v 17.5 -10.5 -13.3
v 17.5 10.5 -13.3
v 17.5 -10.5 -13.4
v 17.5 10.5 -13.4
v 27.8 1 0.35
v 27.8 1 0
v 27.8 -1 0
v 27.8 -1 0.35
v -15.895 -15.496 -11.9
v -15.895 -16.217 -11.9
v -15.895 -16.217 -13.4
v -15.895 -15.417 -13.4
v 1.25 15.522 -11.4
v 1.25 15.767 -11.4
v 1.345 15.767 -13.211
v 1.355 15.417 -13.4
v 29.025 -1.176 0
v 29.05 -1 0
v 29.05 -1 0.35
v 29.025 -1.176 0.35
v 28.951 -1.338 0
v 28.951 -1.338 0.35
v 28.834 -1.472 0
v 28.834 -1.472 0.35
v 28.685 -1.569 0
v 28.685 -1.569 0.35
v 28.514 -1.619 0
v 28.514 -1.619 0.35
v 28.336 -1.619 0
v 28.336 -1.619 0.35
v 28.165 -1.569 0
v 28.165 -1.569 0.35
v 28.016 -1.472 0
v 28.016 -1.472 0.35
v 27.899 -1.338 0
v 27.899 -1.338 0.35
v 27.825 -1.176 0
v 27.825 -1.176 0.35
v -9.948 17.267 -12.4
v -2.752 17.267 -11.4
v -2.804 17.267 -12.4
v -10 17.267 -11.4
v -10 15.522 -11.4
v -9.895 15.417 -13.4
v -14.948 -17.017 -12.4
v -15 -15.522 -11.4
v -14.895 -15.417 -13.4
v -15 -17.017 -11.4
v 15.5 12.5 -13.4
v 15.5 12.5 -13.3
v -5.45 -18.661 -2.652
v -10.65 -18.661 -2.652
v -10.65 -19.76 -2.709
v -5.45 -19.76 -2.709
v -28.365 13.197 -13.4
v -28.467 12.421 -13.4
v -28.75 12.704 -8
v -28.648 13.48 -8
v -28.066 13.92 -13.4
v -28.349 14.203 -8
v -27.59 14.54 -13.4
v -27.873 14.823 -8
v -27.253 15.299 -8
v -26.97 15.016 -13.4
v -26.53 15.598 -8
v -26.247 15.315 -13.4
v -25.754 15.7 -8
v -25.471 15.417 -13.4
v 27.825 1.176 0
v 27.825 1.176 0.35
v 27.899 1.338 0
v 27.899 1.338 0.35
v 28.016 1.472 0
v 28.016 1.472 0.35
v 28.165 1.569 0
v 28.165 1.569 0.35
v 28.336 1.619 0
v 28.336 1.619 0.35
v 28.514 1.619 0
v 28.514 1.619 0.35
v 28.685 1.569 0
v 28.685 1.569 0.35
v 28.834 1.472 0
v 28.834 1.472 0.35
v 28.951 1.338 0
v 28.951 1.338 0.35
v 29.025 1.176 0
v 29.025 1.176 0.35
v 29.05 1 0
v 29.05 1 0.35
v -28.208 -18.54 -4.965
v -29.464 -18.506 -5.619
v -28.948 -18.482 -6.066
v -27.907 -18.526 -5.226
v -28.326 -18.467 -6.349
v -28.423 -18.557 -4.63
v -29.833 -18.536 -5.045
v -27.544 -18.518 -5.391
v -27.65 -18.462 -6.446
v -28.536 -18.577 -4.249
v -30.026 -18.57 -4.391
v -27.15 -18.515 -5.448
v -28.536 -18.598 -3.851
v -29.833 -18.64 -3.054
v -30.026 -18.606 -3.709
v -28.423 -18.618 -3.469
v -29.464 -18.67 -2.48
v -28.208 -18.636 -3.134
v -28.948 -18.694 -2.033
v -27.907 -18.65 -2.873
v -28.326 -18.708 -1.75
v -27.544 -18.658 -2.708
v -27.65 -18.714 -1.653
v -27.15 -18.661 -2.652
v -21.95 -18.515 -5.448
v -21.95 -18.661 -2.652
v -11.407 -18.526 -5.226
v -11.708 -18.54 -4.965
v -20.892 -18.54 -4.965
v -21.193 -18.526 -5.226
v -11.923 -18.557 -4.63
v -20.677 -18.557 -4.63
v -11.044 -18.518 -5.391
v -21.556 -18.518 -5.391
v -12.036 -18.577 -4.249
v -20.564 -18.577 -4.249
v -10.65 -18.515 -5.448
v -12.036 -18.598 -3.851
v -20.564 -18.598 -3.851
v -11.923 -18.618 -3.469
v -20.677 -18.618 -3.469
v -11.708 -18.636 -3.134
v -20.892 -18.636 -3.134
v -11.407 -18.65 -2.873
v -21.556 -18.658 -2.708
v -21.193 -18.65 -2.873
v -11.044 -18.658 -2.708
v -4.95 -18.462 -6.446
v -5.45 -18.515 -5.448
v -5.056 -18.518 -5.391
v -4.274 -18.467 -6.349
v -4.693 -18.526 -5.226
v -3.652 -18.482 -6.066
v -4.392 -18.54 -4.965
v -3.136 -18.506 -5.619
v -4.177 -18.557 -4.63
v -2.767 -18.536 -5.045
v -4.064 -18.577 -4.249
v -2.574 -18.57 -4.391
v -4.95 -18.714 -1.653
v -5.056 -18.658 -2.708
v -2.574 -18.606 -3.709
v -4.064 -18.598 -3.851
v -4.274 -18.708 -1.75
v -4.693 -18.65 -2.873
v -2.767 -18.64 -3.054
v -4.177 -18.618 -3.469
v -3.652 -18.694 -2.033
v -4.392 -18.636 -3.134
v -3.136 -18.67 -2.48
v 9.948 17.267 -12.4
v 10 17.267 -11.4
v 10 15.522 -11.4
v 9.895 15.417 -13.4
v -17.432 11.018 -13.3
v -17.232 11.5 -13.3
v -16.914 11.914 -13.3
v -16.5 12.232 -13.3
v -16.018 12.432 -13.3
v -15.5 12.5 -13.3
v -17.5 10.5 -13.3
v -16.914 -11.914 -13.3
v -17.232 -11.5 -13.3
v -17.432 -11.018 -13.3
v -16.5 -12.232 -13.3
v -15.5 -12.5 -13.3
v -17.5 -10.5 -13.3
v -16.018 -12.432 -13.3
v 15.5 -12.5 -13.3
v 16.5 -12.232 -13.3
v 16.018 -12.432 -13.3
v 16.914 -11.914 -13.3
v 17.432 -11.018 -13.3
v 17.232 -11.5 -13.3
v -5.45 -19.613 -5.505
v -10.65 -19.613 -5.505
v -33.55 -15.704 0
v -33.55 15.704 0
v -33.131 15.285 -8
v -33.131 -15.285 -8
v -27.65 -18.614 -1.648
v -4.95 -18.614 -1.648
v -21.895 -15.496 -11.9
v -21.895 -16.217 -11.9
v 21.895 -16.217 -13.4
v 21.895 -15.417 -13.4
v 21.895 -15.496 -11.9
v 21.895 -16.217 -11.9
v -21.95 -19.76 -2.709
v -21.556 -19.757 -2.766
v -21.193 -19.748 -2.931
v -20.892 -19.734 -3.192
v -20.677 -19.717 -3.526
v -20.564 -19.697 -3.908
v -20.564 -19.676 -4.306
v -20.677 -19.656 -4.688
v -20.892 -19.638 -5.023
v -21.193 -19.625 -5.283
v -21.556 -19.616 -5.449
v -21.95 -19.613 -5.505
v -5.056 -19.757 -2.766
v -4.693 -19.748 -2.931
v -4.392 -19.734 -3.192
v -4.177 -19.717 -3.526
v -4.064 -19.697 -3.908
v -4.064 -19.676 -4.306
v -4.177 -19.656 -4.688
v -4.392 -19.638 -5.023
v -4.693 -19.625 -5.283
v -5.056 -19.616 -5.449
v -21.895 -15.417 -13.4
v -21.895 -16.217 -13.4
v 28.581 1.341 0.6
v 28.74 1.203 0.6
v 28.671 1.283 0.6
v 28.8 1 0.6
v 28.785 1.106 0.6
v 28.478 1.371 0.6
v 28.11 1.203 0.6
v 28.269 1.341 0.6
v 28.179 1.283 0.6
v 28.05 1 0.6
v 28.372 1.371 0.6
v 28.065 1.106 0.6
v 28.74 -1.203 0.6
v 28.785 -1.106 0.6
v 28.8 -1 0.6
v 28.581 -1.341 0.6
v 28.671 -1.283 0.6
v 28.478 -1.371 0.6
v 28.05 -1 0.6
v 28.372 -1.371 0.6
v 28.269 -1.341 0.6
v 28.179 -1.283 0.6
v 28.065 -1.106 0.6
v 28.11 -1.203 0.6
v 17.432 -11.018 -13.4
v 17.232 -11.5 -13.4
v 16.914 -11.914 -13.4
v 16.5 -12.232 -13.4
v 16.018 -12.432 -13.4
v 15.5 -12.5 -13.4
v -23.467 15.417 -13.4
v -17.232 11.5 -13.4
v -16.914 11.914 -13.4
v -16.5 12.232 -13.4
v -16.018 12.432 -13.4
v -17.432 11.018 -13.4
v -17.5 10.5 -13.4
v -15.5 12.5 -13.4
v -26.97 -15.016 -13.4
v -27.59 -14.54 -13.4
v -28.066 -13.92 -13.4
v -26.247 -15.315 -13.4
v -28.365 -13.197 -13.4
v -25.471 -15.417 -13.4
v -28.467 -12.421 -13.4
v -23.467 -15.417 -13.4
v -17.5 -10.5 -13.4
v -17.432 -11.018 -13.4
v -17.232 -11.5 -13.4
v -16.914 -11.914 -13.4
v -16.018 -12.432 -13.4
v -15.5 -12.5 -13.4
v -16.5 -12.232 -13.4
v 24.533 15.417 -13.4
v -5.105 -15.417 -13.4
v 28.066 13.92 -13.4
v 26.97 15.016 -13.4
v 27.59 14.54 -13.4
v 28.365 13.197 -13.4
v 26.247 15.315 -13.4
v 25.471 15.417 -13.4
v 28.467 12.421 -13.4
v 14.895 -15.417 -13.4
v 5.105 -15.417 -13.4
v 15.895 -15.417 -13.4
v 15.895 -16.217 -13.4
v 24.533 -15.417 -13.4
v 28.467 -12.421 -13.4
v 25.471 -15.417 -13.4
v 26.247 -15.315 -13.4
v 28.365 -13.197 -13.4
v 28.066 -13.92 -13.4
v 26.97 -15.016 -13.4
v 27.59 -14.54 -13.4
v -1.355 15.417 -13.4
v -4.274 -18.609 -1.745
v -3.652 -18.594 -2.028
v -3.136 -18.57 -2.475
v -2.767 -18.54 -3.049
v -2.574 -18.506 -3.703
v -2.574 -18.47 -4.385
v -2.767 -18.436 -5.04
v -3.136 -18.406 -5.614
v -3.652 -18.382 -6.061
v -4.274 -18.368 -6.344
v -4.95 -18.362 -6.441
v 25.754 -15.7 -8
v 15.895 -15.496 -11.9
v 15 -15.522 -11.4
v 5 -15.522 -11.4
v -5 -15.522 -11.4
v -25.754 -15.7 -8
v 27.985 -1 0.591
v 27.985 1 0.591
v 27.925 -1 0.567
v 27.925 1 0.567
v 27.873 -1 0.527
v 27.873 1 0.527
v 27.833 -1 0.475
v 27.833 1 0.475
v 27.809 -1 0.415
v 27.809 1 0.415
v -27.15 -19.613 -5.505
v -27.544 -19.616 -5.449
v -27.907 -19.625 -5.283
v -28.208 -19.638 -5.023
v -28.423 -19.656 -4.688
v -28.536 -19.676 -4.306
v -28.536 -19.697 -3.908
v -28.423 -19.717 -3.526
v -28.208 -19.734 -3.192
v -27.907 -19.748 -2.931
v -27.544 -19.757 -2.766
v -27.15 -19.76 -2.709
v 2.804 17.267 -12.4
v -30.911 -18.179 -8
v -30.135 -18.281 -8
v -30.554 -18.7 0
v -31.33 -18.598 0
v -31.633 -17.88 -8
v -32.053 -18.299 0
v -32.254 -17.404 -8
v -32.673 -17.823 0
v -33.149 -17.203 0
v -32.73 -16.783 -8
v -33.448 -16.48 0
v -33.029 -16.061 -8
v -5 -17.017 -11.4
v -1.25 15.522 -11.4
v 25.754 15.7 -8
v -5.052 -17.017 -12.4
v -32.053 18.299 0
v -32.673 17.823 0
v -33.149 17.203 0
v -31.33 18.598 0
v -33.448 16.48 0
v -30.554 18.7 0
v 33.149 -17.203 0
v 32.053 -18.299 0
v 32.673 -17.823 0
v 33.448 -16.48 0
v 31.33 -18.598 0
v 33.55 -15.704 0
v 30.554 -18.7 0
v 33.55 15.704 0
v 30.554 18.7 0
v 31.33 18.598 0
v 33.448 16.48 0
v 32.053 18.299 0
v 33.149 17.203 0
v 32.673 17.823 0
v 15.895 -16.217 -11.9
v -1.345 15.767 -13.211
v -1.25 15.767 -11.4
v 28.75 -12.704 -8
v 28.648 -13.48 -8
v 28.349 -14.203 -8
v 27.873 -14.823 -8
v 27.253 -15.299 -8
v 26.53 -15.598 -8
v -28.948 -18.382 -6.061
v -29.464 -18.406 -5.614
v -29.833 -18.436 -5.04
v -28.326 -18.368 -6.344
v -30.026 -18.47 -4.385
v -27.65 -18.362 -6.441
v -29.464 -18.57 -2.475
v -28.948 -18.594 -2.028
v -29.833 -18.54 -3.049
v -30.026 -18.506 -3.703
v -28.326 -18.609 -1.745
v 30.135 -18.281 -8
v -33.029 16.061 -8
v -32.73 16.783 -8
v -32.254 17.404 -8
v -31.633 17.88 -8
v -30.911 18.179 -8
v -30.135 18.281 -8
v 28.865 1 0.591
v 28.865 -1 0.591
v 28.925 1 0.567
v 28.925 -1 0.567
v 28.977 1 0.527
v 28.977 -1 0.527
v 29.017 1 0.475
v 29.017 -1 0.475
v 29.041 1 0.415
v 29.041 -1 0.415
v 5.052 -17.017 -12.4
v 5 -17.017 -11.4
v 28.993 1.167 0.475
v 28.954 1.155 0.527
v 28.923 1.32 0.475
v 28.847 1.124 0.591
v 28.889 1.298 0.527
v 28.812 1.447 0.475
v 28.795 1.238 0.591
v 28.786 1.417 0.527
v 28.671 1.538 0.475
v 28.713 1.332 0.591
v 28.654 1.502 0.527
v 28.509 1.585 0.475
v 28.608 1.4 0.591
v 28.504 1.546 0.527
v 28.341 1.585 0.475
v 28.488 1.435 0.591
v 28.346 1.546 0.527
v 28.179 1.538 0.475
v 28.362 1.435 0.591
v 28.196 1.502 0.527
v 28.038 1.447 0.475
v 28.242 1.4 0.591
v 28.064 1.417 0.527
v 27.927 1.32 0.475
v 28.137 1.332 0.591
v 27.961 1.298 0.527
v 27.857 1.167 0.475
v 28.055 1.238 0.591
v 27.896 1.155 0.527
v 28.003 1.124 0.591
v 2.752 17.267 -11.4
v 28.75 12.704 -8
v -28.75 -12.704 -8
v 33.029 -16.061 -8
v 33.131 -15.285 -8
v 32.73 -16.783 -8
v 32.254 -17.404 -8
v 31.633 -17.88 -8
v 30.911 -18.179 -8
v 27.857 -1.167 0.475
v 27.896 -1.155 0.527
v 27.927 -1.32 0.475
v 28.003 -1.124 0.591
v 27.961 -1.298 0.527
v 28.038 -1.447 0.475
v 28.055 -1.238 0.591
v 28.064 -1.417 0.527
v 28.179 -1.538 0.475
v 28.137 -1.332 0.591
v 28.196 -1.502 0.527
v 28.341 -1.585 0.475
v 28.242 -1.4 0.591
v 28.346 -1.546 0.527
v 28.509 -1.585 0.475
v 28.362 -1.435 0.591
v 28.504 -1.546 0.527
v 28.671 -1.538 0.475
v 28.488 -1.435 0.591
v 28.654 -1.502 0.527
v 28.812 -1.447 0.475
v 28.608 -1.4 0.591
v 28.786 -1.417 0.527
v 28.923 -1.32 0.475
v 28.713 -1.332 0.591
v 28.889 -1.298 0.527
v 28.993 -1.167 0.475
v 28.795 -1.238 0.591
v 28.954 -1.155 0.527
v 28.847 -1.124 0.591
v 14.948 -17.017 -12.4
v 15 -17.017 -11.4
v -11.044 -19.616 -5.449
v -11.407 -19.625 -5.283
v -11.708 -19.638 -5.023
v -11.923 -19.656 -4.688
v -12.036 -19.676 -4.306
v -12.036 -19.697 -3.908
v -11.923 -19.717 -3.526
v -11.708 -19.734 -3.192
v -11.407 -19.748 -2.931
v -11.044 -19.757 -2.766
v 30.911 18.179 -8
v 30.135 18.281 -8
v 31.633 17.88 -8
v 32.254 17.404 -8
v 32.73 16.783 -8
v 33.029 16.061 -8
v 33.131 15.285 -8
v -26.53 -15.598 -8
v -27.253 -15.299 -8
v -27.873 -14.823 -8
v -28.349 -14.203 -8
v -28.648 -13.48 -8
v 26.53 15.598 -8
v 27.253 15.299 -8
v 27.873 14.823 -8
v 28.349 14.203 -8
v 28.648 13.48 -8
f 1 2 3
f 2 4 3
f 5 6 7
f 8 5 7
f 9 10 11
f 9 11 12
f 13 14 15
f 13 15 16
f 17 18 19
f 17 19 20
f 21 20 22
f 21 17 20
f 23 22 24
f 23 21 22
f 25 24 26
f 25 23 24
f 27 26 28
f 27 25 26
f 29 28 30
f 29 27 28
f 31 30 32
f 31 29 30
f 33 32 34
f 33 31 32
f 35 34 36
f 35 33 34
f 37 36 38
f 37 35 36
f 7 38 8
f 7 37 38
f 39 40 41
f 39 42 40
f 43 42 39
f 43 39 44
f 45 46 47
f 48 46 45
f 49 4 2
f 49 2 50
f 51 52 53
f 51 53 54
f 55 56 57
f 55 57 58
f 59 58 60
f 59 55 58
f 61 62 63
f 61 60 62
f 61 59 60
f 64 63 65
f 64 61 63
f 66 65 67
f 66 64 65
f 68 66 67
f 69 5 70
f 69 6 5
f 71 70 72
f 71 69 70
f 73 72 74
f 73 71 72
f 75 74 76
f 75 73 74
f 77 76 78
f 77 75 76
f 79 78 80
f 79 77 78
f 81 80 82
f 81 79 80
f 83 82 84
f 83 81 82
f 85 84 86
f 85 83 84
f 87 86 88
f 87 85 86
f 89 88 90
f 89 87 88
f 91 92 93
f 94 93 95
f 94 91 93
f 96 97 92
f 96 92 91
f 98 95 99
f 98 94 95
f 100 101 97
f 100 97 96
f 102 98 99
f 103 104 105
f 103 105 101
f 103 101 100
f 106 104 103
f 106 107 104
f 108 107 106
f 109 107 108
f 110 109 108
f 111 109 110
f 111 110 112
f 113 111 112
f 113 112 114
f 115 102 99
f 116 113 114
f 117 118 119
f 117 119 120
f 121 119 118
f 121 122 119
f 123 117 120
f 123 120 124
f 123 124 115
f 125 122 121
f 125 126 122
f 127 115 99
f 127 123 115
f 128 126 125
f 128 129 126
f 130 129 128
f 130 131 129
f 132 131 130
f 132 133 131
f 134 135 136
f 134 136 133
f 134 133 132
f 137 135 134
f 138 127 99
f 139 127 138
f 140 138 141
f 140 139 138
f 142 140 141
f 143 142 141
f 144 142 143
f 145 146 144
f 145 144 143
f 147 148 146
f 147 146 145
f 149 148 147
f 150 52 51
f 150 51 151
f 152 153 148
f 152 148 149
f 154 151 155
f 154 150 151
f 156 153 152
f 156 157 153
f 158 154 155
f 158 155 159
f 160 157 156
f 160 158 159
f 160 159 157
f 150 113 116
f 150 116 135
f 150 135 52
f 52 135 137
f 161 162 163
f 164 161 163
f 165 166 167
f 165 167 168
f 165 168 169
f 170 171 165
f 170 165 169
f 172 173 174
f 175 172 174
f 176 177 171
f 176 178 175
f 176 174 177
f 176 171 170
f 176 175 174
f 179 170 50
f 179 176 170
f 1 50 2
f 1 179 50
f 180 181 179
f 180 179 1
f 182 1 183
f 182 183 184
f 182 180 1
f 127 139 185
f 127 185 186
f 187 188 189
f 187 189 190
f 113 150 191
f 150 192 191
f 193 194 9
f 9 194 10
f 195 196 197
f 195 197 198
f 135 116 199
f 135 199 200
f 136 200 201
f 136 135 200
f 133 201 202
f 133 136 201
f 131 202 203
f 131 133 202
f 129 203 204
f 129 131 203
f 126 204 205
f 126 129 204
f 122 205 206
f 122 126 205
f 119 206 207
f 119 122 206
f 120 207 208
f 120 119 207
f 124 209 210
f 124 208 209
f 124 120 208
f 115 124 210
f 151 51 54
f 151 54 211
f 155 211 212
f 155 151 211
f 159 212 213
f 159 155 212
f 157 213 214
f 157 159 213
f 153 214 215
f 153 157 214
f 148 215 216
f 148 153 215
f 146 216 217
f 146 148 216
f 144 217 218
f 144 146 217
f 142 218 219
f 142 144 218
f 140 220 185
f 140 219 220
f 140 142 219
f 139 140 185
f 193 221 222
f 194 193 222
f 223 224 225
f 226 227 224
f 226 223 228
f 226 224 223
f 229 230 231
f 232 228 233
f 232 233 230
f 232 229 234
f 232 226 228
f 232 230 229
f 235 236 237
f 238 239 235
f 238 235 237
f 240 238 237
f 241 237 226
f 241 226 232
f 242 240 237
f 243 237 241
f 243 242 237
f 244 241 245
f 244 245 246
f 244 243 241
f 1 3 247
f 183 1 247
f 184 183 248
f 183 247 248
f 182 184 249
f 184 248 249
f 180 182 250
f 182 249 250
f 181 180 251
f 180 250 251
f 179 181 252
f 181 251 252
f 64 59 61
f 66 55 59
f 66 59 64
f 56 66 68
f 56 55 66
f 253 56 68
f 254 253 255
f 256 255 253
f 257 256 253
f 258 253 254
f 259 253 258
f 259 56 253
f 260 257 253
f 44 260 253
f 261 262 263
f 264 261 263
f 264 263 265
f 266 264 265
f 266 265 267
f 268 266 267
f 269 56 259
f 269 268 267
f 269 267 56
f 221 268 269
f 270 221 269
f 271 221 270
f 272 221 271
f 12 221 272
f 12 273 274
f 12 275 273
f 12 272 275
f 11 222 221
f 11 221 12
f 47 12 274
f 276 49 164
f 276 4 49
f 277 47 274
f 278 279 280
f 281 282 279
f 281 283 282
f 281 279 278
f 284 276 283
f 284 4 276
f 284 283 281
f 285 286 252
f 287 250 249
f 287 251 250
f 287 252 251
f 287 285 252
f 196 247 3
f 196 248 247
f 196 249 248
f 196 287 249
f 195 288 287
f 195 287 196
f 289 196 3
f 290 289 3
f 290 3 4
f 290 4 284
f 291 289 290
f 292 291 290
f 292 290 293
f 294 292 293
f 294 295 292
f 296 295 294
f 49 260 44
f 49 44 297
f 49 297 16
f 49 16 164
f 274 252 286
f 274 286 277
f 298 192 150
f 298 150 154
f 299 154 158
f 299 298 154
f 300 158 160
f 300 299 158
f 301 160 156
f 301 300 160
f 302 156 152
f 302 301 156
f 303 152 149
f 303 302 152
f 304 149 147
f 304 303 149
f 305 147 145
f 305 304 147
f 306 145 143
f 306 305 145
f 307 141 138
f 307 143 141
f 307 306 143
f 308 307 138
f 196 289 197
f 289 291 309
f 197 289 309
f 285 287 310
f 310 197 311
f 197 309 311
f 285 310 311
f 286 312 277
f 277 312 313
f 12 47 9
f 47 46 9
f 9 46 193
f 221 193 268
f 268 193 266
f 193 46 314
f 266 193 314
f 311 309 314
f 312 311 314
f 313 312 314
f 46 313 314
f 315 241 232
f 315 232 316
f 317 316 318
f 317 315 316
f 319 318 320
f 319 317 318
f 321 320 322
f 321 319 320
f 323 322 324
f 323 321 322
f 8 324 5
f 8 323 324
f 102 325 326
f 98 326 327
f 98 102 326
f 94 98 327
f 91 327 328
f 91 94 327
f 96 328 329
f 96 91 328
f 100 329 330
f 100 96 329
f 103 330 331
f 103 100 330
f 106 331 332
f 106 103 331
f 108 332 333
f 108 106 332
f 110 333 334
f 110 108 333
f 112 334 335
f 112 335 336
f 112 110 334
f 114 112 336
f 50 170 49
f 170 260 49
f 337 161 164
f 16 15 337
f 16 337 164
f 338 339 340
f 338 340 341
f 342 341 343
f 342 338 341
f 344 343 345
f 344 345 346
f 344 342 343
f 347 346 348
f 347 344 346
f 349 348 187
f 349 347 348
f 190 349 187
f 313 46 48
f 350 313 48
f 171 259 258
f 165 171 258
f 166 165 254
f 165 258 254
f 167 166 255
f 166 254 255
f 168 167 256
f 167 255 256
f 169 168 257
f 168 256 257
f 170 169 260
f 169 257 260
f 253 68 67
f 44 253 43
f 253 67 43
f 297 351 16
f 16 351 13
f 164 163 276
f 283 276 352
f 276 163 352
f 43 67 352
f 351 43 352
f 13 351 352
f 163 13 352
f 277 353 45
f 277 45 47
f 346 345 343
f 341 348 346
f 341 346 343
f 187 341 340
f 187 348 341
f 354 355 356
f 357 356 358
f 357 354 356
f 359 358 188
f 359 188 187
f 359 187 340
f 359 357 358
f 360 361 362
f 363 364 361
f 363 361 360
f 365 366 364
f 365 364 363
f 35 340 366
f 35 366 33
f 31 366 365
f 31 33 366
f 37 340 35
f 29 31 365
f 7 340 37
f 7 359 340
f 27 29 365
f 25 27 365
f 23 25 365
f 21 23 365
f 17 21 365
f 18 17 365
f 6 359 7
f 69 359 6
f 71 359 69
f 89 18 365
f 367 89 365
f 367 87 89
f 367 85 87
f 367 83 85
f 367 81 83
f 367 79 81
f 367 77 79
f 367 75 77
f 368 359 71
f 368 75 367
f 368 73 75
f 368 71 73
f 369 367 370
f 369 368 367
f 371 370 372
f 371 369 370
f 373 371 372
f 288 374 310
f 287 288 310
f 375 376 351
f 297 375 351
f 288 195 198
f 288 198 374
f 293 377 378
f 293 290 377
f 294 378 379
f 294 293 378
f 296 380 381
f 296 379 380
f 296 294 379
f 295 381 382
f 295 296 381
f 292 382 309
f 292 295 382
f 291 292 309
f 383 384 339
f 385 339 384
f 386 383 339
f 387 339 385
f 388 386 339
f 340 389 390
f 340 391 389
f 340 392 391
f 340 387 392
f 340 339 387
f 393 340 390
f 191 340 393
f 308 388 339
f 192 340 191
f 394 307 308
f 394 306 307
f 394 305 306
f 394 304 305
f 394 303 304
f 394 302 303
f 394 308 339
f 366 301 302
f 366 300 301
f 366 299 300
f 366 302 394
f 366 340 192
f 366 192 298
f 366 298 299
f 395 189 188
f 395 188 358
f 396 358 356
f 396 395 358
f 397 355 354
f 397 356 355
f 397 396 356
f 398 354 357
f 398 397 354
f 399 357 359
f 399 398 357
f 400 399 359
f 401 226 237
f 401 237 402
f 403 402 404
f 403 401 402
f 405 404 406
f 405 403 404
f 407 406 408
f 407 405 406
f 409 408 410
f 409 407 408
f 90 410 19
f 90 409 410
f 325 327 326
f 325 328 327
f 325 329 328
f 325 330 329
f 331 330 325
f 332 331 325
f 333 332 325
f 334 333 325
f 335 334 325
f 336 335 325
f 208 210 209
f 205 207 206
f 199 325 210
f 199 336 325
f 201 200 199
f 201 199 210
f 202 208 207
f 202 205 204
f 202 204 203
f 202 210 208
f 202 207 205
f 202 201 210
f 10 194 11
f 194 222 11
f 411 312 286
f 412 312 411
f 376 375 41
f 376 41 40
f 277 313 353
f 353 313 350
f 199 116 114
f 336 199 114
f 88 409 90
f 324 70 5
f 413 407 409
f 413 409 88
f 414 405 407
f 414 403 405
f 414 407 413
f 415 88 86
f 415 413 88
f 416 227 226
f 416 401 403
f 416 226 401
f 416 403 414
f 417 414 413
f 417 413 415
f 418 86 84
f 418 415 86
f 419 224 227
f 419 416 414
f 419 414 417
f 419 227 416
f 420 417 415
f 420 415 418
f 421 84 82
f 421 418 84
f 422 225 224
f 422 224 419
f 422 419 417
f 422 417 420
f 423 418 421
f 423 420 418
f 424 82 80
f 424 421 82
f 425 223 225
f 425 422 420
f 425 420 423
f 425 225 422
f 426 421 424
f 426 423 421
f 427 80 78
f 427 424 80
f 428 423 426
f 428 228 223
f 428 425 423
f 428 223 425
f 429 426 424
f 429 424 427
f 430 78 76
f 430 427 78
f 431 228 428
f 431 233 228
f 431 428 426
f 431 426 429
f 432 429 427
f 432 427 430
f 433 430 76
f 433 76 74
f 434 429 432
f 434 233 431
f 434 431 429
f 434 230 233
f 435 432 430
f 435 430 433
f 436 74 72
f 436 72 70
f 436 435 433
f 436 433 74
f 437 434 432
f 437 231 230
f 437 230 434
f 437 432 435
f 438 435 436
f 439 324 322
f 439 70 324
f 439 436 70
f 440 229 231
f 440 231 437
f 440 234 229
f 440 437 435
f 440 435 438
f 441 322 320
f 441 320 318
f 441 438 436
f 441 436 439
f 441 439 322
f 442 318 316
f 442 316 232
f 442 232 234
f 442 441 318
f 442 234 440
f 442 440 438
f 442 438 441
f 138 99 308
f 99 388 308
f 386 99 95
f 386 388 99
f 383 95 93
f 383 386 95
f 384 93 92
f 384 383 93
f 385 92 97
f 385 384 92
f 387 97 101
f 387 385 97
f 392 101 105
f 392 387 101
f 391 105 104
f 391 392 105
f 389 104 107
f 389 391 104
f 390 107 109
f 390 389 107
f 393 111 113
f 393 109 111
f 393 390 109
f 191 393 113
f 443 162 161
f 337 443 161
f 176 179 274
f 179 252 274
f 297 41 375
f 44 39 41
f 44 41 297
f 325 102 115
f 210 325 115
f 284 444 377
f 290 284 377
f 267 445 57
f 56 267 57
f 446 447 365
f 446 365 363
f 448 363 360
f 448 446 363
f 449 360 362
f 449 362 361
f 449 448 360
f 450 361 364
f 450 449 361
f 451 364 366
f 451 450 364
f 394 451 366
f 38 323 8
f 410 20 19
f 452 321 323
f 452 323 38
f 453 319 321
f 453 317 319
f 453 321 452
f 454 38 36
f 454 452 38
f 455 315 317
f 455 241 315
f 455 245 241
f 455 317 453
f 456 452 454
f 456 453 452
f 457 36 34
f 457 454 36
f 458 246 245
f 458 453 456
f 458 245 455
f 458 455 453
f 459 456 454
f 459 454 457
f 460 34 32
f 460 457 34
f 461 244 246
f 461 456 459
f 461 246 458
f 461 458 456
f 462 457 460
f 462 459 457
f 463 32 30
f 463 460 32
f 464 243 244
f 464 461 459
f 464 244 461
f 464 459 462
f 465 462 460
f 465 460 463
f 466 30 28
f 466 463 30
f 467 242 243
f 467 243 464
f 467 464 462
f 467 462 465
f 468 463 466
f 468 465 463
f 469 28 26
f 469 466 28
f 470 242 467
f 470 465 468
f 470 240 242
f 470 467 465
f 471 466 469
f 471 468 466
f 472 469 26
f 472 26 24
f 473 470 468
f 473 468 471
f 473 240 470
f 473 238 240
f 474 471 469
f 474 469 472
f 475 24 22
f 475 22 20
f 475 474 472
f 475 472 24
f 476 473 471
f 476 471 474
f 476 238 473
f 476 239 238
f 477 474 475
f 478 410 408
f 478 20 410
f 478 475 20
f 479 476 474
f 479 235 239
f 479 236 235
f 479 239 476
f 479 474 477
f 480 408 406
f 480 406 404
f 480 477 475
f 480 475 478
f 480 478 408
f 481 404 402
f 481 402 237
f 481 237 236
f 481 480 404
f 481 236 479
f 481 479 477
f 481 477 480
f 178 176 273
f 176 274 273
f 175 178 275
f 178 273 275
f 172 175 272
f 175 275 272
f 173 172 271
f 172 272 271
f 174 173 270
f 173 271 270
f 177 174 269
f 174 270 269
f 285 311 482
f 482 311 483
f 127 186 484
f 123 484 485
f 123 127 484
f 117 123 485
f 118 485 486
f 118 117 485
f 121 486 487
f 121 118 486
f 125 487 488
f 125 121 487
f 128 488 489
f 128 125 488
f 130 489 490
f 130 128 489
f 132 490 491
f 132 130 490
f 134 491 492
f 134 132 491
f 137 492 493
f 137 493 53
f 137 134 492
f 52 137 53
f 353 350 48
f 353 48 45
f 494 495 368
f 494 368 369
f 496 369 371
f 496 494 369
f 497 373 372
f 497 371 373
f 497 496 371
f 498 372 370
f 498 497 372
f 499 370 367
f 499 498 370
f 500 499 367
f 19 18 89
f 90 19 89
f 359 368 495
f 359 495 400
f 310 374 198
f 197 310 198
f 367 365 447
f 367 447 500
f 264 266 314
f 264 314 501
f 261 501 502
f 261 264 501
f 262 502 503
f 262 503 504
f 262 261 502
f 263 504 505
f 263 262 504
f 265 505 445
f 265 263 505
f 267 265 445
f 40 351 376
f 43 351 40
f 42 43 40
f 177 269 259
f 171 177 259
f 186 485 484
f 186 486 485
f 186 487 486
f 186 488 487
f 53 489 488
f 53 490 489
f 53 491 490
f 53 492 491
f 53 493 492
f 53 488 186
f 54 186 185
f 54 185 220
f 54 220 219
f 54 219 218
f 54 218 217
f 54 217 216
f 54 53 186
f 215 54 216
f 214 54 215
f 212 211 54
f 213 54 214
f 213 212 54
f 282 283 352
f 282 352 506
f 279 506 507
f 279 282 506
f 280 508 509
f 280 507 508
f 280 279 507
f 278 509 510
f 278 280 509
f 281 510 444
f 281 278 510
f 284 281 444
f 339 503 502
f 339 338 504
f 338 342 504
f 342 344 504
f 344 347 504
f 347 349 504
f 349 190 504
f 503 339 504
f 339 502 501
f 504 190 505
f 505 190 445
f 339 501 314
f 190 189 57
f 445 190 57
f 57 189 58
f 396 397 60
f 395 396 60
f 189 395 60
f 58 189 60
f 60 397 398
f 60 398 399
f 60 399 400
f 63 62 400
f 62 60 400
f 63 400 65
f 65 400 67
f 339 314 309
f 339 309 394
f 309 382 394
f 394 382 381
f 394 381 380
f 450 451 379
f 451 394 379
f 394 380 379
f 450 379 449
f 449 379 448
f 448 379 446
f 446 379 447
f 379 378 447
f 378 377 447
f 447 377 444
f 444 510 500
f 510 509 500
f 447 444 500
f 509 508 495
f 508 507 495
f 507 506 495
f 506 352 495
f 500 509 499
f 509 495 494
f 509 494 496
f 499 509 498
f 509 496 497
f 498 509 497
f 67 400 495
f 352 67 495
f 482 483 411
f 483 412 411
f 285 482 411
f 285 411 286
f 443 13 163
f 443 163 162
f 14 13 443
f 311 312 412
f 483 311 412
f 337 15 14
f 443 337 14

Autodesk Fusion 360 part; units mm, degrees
sketch "main-upper" plane through (0, 0, 0) normal (0, 0, 1) x (1, 0, 0)
  line L0 (33.55, 18.7) -> (-33.55, 18.7)
  line L1 (-33.55, 18.7) -> (-33.55, -18.7)
  line L2 (-33.55, -18.7) -> (33.55, -18.7)
  line L3 (33.55, -18.7) -> (33.55, 18.7)
  line L4 (33.55, 18.7) -> (-33.55, -18.7) construction
  line L5 (-33.55, 18.7) -> (33.55, -18.7) construction
  dimension "d1" = 67.1
  dimension "d2" = 37.4
extrude "Extrude1" add sketch "main-upper" against normal blind 8 draft -3
sketch "rgb-led" plane through (0, 0, 0) normal (0, 0, 1) x (-1, 0, 0)
  line L0 (-33.55, 18.7) -> (-33.55, -18.7)
  line L1 (-33.55, -18.7) -> (33.55, -18.7)
  line L2 (33.55, -18.7) -> (33.55, 18.7)
  line L3 (33.55, 18.7) -> (-33.55, 18.7)
  line L4 (-27.8, -1) -> (-27.8, 1)
  arc A0 (-27.8, 1) -> (-29.05, 1) centre (-28.425, 1) ccw
  line L5 (-29.05, 1) -> (-29.05, -1)
  arc A1 (-29.05, -1) -> (-27.8, -1) centre (-28.425, -1) ccw
  line L6 (-28.425, -1.625) -> (-28.425, 1.625) construction
  line L7 (-28.425, -18.7) -> (-28.425, 18.7) construction
  point P0 (-28.425, 0)
  point P1 (-28.425, 0)
  dimension "d5" = 3.25
  dimension "d6" = 1.25
  dimension "d8" = 4.5
extrude "Extrude2" add sketch "rgb-led" along normal blind 0.6 contours L4 A0 L5 A1
fillet "Fillet1" radius 0.25 4 edges at (28.425, 1.625, 0.6) (27.8, 0, 0.6) (28.425, -1.625, 0.6) (29.05, 0, 0.6)
sketch "eink" plane through (0, 0, 0) normal (0, 0, 1) x (-1, 0, 0)
  line L0 (-29.05, -1) -> (-29.05, 1)
  arc A0 (-27.8, 1) -> (-29.05, 1) centre (-28.425, 1) ccw
  line L1 (-27.8, 1) -> (-27.8, -1)
  arc A1 (-29.05, -1) -> (-27.8, -1) centre (-28.425, -1) ccw
  line L2 (-33.55, 18.7) -> (-33.55, -18.7)
  line L3 (-33.55, -18.7) -> (33.55, -18.7)
  line L4 (33.55, -18.7) -> (33.55, 18.7)
  line L5 (33.55, 18.7) -> (-33.55, 18.7)
  line L6 (-24.05, 14) -> (24.05, 14)
  line L7 (24.05, 14) -> (24.05, -14)
  line L8 (24.05, -14) -> (-24.05, -14)
  line L9 (-24.05, -14) -> (-24.05, 14)
  line L10 (-24.05, 14) -> (24.05, -14) construction
  line L11 (24.05, 14) -> (-24.05, -14) construction
  dimension "d13" = 48.1
  dimension "d14" = 28
sketch "buttons-base" plane through (0, -18.6488, -0.9773) normal (0, -0.9986, -0.0523) x (1, 0, 0)
  line L0 (-33.1307, -7.0323) -> (33.1307, -7.0323)
  line L1 (33.1307, -7.0323) -> (33.55, 0.9787)
  line L2 (33.55, 0.9787) -> (-33.55, 0.9787)
  line L3 (-33.55, 0.9787) -> (-33.1307, -7.0323)
  line L4 (-27.65, -5.4713) -> (-4.95, -5.4713)
  arc A0 (-4.95, -5.4713) -> (-4.95, -0.6713) centre (-4.95, -3.0713) ccw
  line L5 (-4.95, -0.6713) -> (-27.65, -0.6713)
  arc A1 (-27.65, -0.6713) -> (-27.65, -5.4713) centre (-27.65, -3.0713) ccw
  line L6 (-30.05, -3.0713) -> (-2.55, -3.0713) construction
  dimension "d15" = 4.8
  dimension "d16" = 27.5
  dimension "d17" = 1.65
  dimension "d19" = 3.5
sketch "buttons" plane through (0, -18.6488, -0.9773) normal (0, -0.9986, -0.0523) x (1, 0, 0)
  line L0 (-27.15, -4.4713) -> (-21.95, -4.4713)
  arc A0 (-21.95, -4.4713) -> (-21.95, -1.6713) centre (-21.95, -3.0713) ccw
  line L1 (-21.95, -1.6713) -> (-27.15, -1.6713)
  arc A1 (-27.15, -1.6713) -> (-27.15, -4.4713) centre (-27.15, -3.0713) ccw
  line L2 (-28.55, -3.0713) -> (-20.55, -3.0713) construction
  line L3 (-30.05, -3.0713) -> (-2.55, -3.0713)
  line L4 (-27.65, -5.4713) -> (-4.95, -5.4713)
  line L5 (-16.3, -3.0713) -> (-16.3, -5.4713) construction
  line L6 (-5.45, -4.4713) -> (-10.65, -4.4713)
  arc A2 (-10.65, -1.6713) -> (-10.65, -4.4713) centre (-10.65, -3.0713) ccw
  line L7 (-10.65, -1.6713) -> (-5.45, -1.6713)
  arc A3 (-5.45, -4.4713) -> (-5.45, -1.6713) centre (-5.45, -3.0713) ccw
  dimension "d20" = 8
  dimension "d21" = 2.8
  dimension "d22" = 1.5
extrude "Extrude3" add sketch "buttons-base" along normal blind 0.1 contours L4 A0 L5 A1
extrude "Extrude4" add sketch "buttons" along normal blind 1.2
sketch "batery-compartment-body" plane through (0, 0, -8) normal (0, 0, -1) x (1, 0, 0)
  line L0 (-33.1307, -18.2807) -> (33.1307, -18.2807)
  line L1 (33.1307, -18.2807) -> (33.1307, 18.2807)
  line L2 (33.1307, 18.2807) -> (-33.1307, 18.2807)
  line L3 (-33.1307, 18.2807) -> (-33.1307, -18.2807)
  line L4 (-28.75, -15.7) -> (28.75, -15.7)
  line L5 (28.75, -15.7) -> (28.75, 15.7)
  line L6 (28.75, 15.7) -> (-28.75, 15.7)
  line L7 (-28.75, 15.7) -> (-28.75, -15.7)
  line L8 (-28.75, -15.7) -> (28.75, 15.7) construction
  line L9 (28.75, -15.7) -> (-28.75, 15.7) construction
  dimension "d27" = 57.5
  dimension "d28" = 31.4
extrude "Extrude5" add sketch "batery-compartment-body" along normal blind 5.4 draft -3 contours L4 L5 L6 L7
sketch "rear-label-indent" plane through (0, 0, -13.4) normal (0, 0, -1) x (1, 0, 0)
  line L0 (28.467, 15.417) -> (-28.467, 15.417)
  line L1 (-28.467, 15.417) -> (-28.467, -15.417)
  line L2 (-28.467, -15.417) -> (28.467, -15.417)
  line L3 (28.467, -15.417) -> (28.467, 15.417)
  line L4 (15.5, 12.5) -> (-15.5, 12.5)
  line L5 (-17.5, 10.5) -> (-17.5, -10.5)
  line L6 (-15.5, -12.5) -> (15.5, -12.5)
  line L7 (17.5, -10.5) -> (17.5, 10.5)
  line L8 (17.5, 12.5) -> (-17.5, -12.5) construction
  line L9 (-17.5, 12.5) -> (17.5, -12.5) construction
  line L10 (17.5, -10.5) -> (15.5, -12.5)
  line L11 (17.5, -12.5) -> (17.5, -10.5) construction
  line L12 (15.5, -12.5) -> (17.5, -12.5) construction
  arc A0 (-17.5, -10.5) -> (-15.5, -12.5) centre (-15.5, -10.5) ccw
  arc A1 (-15.5, 12.5) -> (-17.5, 10.5) centre (-15.5, 10.5) ccw
  arc A2 (17.5, 10.5) -> (15.5, 12.5) centre (15.5, 10.5) ccw
  dimension "d34" = 35
  dimension "d35" = 25
  dimension "d36" = 45
  dimension "d37" = 33
  dimension "d38" = 2
  dimension "d39" = 2
  dimension "d40" = 2
extrude "Extrude6" cut sketch "rear-label-indent" against normal blind 0.1 contours L4 L5 L6 L7 L10 A0 A1 A2
ref_plane "WorkPlane1" through (-28.467, 0, 0) normal (1, 0, 0) x (0, 1, 0)
sketch "clips-profiile" plane through (-28.467, 0, 0) normal (1, 0, 0) x (0, 1, 0)
  line L0 (15.417, -13.4) -> (-15.417, -13.4)
  line L1 (-15.417, -13.4) -> (-15.7, -8)
  line L2 (-15.7, -8) -> (15.7, -8)
  line L3 (15.7, -8) -> (15.417, -13.4)
  line L4 (-15.5218, -11.4) -> (-17.017, -11.4)
  line L5 (-17.017, -11.4) -> (-17.017, -12.4)
  line L6 (-17.017, -12.4) -> (-15.417, -13.4)
  line L7 (15.5218, -11.4) -> (17.267, -11.4)
  line L8 (17.267, -11.4) -> (17.267, -12.4)
  line L9 (17.267, -12.4) -> (15.417, -13.4)
  dimension "d49" = 2
  dimension "d50" = 1.6
  dimension "d51" = 1.85
  dimension "d52" = 1
  dimension "d53" = 1
fillet "Fillet2" radius 3 4 edges at (-33.3404, 18.4904, -4) (33.3404, 18.4904, -4) (33.3404, -18.4904, -4) (-33.3404, -18.4904, -4)
fillet "Fillet3" radius 3 4 edges at (28.6085, 15.5585, -10.7) (28.6085, -15.5585, -10.7) (-28.6085, -15.5585, -10.7) (-28.6085, 15.5585, -10.7)
extrude "Extrude7" add sketch "clips-profiile" along normal blind 48 from surface at 5 contours L3 L7 L8 L9 | L1 L4 L5 L6
sketch "clips-cut" plane through (0, 0, -11.4) normal (0, 0, 1) x (-1, 0, 0)
  line L0 (23.467, -17.267) -> (23.467, -15.5218)
  line L1 (23.467, -15.5218) -> (-24.533, -15.5218)
  line L2 (-24.533, -15.5218) -> (-24.533, -17.267)
  line L3 (-24.533, -17.267) -> (23.467, -17.267)
  line L4 (23.467, 15.5218) -> (23.467, 17.017)
  line L5 (23.467, 17.017) -> (-24.533, 17.017)
  line L6 (-24.533, 17.017) -> (-24.533, 15.5218)
  line L7 (-24.533, 15.5218) -> (23.467, 15.5218)
  line L8 (21.95, 18.6612) -> (27.15, 18.6612)
  line L9 (27.15, 18.6612) -> (27.15, 19.7597)
  line L10 (27.15, 19.7597) -> (21.95, 19.7597)
  line L11 (21.95, 19.7597) -> (21.95, 18.6612)
  line L12 (5.45, 18.6612) -> (10.65, 18.6612)
  line L13 (10.65, 18.6612) -> (10.65, 19.7597)
  line L14 (10.65, 19.7597) -> (5.45, 19.7597)
  line L15 (5.45, 19.7597) -> (5.45, 18.6612)
  line L16 (0, 0) -> (0, 30) construction
  line L17 (5, 15.5218) -> (5, 17.017)
  line L18 (15, 15.5218) -> (15, 17.017)
  line L19 (-15, 15.5218) -> (-15, 17.017)
  line L20 (-5, 15.5218) -> (-5, 17.017)
  line L21 (-10, -17.267) -> (-10, -15.5218)
  line L22 (10, -17.267) -> (10, -15.5218)
  line L23 (-1.25, -17.267) -> (-1.25, -15.5218)
  line L24 (1.25, -17.267) -> (1.25, -15.5218)
  dimension "d61" = 10
  dimension "d62" = 5
  dimension "d63" = 10
  dimension "d64" = 1.25
extrude "Extrude9" cut sketch "clips-cut" against normal blind 2 draft 3 contours L4 L5 L7 L18 | L5 L7 L17 L20 | L5 L6 L7 L19
extrude "Extrude10" cut sketch "clips-cut" against normal blind 2 draft 3 contours L0 L1 L3 L22 | L1 L3 L23 L24 | L1 L2 L3 L21
chamfer "Chamfer1" distance 1.5 angle 45 2 edges at (1.2762, 17.267, -11.9) (-1.2762, 17.267, -11.9)
sketch "battery-door-tabs" plane through (0, 0, -13.4) normal (0, 0, -1) x (1, 0, 0)
  arc A0 (17.5, 10.5) -> (15.5, 12.5) centre (15.5, 10.5) ccw
  line L0 (17.5, 10.5) -> (17.5, -10.5)
  line L1 (17.5, -10.5) -> (15.5, -12.5)
  line L2 (15.5, -12.5) -> (-15.5, -12.5)
  arc A1 (-17.5, -10.5) -> (-15.5, -12.5) centre (-15.5, -10.5) ccw
  line L3 (-17.5, -10.5) -> (-17.5, 10.5)
  arc A2 (-15.5, 12.5) -> (-17.5, 10.5) centre (-15.5, 10.5) ccw
  line L4 (-15.5, 12.5) -> (15.5, 12.5)
  ellipse E0 centre (-25.4629, -12.4129) end of major axis (-27.59, -14.54) minor radius 3 (-28.467, -12.4211) -> (-25.4711, -15.417) ccw
  line L5 (-25.4711, -15.417) -> (-9.8952, -15.417)
  line L6 (-9.8952, -15.417) -> (-1.3548, -15.417)
  line L7 (-1.3548, -15.417) -> (1.3548, -15.417)
  line L8 (1.3548, -15.417) -> (9.8952, -15.417)
  line L9 (9.8952, -15.417) -> (25.4711, -15.417)
  ellipse E1 centre (25.4629, -12.4129) end of major axis (27.59, -14.54) minor radius 3 (25.4711, -15.417) -> (28.467, -12.4211) ccw
  line L10 (28.467, -12.4211) -> (28.467, 12.4211)
  ellipse E2 centre (25.4629, 12.4129) end of major axis (27.59, 14.54) minor radius 3 (28.467, 12.4211) -> (25.4711, 15.417) ccw
  line L11 (25.4711, 15.417) -> (14.8952, 15.417)
  line L12 (14.8952, 15.417) -> (5.1048, 15.417)
  line L13 (5.1048, 15.417) -> (-5.1048, 15.417)
  line L14 (-5.1048, 15.417) -> (-14.8952, 15.417)
  line L15 (-14.8952, 15.417) -> (-25.4711, 15.417)
  ellipse E3 centre (-25.4629, 12.4129) end of major axis (-27.59, 14.54) minor radius 3 (-25.4711, 15.417) -> (-28.467, 12.4211) ccw
  line L16 (-28.467, 12.4211) -> (-28.467, -12.4211)
  line L17 (-5.1048, 15.417) -> (-5.0524, 17.017)
  line L18 (-5.0524, 17.017) -> (-14.9476, 17.017)
  line L19 (-14.9476, 17.017) -> (-14.8952, 15.417)
  line L20 (-14.8952, 15.417) -> (-5.1048, 15.417)
  line L21 (-15.8952, 15.417) -> (-21.8952, 15.417)
  line L22 (-21.8952, 15.417) -> (-21.8952, 16.217)
  line L23 (-21.8952, 16.217) -> (-15.8952, 16.217)
  line L24 (-15.8952, 16.217) -> (-15.8952, 15.417)
  line L25 (-15.8952, 15.417) -> (-21.8952, 16.217) construction
  line L26 (-21.8952, 15.417) -> (-15.8952, 16.217) construction
  line L27 (0, 0) -> (0, 15.417) construction
  line L28 (15.8952, 16.217) -> (15.8952, 15.417)
  line L29 (21.8952, 15.417) -> (21.8952, 16.217)
  line L30 (21.8952, 16.217) -> (15.8952, 16.217)
  point P0 (-18.8952, 15.817)
  dimension "d75" = 0.8
  dimension "d76" = 6
  dimension "d77" = 1
extrude "Extrude11" add sketch "battery-door-tabs" against normal blind 1.5 contours L15 L21 L22 L23 L24 | L11 L28 L29 L30
equation "d64 = ( 2.5 / 2 ) * 1 mm"
equation "d66 = body_draft_angle"
equation "d68 = body_draft_angle"
equation "d71 = corner_radius"
equation "d73 = corner_radius"
equation "corner_radius = 3.0 mm"
equation "body_draft_angle = 3 deg"
equation "pogo_pad = 1.5 mm"
